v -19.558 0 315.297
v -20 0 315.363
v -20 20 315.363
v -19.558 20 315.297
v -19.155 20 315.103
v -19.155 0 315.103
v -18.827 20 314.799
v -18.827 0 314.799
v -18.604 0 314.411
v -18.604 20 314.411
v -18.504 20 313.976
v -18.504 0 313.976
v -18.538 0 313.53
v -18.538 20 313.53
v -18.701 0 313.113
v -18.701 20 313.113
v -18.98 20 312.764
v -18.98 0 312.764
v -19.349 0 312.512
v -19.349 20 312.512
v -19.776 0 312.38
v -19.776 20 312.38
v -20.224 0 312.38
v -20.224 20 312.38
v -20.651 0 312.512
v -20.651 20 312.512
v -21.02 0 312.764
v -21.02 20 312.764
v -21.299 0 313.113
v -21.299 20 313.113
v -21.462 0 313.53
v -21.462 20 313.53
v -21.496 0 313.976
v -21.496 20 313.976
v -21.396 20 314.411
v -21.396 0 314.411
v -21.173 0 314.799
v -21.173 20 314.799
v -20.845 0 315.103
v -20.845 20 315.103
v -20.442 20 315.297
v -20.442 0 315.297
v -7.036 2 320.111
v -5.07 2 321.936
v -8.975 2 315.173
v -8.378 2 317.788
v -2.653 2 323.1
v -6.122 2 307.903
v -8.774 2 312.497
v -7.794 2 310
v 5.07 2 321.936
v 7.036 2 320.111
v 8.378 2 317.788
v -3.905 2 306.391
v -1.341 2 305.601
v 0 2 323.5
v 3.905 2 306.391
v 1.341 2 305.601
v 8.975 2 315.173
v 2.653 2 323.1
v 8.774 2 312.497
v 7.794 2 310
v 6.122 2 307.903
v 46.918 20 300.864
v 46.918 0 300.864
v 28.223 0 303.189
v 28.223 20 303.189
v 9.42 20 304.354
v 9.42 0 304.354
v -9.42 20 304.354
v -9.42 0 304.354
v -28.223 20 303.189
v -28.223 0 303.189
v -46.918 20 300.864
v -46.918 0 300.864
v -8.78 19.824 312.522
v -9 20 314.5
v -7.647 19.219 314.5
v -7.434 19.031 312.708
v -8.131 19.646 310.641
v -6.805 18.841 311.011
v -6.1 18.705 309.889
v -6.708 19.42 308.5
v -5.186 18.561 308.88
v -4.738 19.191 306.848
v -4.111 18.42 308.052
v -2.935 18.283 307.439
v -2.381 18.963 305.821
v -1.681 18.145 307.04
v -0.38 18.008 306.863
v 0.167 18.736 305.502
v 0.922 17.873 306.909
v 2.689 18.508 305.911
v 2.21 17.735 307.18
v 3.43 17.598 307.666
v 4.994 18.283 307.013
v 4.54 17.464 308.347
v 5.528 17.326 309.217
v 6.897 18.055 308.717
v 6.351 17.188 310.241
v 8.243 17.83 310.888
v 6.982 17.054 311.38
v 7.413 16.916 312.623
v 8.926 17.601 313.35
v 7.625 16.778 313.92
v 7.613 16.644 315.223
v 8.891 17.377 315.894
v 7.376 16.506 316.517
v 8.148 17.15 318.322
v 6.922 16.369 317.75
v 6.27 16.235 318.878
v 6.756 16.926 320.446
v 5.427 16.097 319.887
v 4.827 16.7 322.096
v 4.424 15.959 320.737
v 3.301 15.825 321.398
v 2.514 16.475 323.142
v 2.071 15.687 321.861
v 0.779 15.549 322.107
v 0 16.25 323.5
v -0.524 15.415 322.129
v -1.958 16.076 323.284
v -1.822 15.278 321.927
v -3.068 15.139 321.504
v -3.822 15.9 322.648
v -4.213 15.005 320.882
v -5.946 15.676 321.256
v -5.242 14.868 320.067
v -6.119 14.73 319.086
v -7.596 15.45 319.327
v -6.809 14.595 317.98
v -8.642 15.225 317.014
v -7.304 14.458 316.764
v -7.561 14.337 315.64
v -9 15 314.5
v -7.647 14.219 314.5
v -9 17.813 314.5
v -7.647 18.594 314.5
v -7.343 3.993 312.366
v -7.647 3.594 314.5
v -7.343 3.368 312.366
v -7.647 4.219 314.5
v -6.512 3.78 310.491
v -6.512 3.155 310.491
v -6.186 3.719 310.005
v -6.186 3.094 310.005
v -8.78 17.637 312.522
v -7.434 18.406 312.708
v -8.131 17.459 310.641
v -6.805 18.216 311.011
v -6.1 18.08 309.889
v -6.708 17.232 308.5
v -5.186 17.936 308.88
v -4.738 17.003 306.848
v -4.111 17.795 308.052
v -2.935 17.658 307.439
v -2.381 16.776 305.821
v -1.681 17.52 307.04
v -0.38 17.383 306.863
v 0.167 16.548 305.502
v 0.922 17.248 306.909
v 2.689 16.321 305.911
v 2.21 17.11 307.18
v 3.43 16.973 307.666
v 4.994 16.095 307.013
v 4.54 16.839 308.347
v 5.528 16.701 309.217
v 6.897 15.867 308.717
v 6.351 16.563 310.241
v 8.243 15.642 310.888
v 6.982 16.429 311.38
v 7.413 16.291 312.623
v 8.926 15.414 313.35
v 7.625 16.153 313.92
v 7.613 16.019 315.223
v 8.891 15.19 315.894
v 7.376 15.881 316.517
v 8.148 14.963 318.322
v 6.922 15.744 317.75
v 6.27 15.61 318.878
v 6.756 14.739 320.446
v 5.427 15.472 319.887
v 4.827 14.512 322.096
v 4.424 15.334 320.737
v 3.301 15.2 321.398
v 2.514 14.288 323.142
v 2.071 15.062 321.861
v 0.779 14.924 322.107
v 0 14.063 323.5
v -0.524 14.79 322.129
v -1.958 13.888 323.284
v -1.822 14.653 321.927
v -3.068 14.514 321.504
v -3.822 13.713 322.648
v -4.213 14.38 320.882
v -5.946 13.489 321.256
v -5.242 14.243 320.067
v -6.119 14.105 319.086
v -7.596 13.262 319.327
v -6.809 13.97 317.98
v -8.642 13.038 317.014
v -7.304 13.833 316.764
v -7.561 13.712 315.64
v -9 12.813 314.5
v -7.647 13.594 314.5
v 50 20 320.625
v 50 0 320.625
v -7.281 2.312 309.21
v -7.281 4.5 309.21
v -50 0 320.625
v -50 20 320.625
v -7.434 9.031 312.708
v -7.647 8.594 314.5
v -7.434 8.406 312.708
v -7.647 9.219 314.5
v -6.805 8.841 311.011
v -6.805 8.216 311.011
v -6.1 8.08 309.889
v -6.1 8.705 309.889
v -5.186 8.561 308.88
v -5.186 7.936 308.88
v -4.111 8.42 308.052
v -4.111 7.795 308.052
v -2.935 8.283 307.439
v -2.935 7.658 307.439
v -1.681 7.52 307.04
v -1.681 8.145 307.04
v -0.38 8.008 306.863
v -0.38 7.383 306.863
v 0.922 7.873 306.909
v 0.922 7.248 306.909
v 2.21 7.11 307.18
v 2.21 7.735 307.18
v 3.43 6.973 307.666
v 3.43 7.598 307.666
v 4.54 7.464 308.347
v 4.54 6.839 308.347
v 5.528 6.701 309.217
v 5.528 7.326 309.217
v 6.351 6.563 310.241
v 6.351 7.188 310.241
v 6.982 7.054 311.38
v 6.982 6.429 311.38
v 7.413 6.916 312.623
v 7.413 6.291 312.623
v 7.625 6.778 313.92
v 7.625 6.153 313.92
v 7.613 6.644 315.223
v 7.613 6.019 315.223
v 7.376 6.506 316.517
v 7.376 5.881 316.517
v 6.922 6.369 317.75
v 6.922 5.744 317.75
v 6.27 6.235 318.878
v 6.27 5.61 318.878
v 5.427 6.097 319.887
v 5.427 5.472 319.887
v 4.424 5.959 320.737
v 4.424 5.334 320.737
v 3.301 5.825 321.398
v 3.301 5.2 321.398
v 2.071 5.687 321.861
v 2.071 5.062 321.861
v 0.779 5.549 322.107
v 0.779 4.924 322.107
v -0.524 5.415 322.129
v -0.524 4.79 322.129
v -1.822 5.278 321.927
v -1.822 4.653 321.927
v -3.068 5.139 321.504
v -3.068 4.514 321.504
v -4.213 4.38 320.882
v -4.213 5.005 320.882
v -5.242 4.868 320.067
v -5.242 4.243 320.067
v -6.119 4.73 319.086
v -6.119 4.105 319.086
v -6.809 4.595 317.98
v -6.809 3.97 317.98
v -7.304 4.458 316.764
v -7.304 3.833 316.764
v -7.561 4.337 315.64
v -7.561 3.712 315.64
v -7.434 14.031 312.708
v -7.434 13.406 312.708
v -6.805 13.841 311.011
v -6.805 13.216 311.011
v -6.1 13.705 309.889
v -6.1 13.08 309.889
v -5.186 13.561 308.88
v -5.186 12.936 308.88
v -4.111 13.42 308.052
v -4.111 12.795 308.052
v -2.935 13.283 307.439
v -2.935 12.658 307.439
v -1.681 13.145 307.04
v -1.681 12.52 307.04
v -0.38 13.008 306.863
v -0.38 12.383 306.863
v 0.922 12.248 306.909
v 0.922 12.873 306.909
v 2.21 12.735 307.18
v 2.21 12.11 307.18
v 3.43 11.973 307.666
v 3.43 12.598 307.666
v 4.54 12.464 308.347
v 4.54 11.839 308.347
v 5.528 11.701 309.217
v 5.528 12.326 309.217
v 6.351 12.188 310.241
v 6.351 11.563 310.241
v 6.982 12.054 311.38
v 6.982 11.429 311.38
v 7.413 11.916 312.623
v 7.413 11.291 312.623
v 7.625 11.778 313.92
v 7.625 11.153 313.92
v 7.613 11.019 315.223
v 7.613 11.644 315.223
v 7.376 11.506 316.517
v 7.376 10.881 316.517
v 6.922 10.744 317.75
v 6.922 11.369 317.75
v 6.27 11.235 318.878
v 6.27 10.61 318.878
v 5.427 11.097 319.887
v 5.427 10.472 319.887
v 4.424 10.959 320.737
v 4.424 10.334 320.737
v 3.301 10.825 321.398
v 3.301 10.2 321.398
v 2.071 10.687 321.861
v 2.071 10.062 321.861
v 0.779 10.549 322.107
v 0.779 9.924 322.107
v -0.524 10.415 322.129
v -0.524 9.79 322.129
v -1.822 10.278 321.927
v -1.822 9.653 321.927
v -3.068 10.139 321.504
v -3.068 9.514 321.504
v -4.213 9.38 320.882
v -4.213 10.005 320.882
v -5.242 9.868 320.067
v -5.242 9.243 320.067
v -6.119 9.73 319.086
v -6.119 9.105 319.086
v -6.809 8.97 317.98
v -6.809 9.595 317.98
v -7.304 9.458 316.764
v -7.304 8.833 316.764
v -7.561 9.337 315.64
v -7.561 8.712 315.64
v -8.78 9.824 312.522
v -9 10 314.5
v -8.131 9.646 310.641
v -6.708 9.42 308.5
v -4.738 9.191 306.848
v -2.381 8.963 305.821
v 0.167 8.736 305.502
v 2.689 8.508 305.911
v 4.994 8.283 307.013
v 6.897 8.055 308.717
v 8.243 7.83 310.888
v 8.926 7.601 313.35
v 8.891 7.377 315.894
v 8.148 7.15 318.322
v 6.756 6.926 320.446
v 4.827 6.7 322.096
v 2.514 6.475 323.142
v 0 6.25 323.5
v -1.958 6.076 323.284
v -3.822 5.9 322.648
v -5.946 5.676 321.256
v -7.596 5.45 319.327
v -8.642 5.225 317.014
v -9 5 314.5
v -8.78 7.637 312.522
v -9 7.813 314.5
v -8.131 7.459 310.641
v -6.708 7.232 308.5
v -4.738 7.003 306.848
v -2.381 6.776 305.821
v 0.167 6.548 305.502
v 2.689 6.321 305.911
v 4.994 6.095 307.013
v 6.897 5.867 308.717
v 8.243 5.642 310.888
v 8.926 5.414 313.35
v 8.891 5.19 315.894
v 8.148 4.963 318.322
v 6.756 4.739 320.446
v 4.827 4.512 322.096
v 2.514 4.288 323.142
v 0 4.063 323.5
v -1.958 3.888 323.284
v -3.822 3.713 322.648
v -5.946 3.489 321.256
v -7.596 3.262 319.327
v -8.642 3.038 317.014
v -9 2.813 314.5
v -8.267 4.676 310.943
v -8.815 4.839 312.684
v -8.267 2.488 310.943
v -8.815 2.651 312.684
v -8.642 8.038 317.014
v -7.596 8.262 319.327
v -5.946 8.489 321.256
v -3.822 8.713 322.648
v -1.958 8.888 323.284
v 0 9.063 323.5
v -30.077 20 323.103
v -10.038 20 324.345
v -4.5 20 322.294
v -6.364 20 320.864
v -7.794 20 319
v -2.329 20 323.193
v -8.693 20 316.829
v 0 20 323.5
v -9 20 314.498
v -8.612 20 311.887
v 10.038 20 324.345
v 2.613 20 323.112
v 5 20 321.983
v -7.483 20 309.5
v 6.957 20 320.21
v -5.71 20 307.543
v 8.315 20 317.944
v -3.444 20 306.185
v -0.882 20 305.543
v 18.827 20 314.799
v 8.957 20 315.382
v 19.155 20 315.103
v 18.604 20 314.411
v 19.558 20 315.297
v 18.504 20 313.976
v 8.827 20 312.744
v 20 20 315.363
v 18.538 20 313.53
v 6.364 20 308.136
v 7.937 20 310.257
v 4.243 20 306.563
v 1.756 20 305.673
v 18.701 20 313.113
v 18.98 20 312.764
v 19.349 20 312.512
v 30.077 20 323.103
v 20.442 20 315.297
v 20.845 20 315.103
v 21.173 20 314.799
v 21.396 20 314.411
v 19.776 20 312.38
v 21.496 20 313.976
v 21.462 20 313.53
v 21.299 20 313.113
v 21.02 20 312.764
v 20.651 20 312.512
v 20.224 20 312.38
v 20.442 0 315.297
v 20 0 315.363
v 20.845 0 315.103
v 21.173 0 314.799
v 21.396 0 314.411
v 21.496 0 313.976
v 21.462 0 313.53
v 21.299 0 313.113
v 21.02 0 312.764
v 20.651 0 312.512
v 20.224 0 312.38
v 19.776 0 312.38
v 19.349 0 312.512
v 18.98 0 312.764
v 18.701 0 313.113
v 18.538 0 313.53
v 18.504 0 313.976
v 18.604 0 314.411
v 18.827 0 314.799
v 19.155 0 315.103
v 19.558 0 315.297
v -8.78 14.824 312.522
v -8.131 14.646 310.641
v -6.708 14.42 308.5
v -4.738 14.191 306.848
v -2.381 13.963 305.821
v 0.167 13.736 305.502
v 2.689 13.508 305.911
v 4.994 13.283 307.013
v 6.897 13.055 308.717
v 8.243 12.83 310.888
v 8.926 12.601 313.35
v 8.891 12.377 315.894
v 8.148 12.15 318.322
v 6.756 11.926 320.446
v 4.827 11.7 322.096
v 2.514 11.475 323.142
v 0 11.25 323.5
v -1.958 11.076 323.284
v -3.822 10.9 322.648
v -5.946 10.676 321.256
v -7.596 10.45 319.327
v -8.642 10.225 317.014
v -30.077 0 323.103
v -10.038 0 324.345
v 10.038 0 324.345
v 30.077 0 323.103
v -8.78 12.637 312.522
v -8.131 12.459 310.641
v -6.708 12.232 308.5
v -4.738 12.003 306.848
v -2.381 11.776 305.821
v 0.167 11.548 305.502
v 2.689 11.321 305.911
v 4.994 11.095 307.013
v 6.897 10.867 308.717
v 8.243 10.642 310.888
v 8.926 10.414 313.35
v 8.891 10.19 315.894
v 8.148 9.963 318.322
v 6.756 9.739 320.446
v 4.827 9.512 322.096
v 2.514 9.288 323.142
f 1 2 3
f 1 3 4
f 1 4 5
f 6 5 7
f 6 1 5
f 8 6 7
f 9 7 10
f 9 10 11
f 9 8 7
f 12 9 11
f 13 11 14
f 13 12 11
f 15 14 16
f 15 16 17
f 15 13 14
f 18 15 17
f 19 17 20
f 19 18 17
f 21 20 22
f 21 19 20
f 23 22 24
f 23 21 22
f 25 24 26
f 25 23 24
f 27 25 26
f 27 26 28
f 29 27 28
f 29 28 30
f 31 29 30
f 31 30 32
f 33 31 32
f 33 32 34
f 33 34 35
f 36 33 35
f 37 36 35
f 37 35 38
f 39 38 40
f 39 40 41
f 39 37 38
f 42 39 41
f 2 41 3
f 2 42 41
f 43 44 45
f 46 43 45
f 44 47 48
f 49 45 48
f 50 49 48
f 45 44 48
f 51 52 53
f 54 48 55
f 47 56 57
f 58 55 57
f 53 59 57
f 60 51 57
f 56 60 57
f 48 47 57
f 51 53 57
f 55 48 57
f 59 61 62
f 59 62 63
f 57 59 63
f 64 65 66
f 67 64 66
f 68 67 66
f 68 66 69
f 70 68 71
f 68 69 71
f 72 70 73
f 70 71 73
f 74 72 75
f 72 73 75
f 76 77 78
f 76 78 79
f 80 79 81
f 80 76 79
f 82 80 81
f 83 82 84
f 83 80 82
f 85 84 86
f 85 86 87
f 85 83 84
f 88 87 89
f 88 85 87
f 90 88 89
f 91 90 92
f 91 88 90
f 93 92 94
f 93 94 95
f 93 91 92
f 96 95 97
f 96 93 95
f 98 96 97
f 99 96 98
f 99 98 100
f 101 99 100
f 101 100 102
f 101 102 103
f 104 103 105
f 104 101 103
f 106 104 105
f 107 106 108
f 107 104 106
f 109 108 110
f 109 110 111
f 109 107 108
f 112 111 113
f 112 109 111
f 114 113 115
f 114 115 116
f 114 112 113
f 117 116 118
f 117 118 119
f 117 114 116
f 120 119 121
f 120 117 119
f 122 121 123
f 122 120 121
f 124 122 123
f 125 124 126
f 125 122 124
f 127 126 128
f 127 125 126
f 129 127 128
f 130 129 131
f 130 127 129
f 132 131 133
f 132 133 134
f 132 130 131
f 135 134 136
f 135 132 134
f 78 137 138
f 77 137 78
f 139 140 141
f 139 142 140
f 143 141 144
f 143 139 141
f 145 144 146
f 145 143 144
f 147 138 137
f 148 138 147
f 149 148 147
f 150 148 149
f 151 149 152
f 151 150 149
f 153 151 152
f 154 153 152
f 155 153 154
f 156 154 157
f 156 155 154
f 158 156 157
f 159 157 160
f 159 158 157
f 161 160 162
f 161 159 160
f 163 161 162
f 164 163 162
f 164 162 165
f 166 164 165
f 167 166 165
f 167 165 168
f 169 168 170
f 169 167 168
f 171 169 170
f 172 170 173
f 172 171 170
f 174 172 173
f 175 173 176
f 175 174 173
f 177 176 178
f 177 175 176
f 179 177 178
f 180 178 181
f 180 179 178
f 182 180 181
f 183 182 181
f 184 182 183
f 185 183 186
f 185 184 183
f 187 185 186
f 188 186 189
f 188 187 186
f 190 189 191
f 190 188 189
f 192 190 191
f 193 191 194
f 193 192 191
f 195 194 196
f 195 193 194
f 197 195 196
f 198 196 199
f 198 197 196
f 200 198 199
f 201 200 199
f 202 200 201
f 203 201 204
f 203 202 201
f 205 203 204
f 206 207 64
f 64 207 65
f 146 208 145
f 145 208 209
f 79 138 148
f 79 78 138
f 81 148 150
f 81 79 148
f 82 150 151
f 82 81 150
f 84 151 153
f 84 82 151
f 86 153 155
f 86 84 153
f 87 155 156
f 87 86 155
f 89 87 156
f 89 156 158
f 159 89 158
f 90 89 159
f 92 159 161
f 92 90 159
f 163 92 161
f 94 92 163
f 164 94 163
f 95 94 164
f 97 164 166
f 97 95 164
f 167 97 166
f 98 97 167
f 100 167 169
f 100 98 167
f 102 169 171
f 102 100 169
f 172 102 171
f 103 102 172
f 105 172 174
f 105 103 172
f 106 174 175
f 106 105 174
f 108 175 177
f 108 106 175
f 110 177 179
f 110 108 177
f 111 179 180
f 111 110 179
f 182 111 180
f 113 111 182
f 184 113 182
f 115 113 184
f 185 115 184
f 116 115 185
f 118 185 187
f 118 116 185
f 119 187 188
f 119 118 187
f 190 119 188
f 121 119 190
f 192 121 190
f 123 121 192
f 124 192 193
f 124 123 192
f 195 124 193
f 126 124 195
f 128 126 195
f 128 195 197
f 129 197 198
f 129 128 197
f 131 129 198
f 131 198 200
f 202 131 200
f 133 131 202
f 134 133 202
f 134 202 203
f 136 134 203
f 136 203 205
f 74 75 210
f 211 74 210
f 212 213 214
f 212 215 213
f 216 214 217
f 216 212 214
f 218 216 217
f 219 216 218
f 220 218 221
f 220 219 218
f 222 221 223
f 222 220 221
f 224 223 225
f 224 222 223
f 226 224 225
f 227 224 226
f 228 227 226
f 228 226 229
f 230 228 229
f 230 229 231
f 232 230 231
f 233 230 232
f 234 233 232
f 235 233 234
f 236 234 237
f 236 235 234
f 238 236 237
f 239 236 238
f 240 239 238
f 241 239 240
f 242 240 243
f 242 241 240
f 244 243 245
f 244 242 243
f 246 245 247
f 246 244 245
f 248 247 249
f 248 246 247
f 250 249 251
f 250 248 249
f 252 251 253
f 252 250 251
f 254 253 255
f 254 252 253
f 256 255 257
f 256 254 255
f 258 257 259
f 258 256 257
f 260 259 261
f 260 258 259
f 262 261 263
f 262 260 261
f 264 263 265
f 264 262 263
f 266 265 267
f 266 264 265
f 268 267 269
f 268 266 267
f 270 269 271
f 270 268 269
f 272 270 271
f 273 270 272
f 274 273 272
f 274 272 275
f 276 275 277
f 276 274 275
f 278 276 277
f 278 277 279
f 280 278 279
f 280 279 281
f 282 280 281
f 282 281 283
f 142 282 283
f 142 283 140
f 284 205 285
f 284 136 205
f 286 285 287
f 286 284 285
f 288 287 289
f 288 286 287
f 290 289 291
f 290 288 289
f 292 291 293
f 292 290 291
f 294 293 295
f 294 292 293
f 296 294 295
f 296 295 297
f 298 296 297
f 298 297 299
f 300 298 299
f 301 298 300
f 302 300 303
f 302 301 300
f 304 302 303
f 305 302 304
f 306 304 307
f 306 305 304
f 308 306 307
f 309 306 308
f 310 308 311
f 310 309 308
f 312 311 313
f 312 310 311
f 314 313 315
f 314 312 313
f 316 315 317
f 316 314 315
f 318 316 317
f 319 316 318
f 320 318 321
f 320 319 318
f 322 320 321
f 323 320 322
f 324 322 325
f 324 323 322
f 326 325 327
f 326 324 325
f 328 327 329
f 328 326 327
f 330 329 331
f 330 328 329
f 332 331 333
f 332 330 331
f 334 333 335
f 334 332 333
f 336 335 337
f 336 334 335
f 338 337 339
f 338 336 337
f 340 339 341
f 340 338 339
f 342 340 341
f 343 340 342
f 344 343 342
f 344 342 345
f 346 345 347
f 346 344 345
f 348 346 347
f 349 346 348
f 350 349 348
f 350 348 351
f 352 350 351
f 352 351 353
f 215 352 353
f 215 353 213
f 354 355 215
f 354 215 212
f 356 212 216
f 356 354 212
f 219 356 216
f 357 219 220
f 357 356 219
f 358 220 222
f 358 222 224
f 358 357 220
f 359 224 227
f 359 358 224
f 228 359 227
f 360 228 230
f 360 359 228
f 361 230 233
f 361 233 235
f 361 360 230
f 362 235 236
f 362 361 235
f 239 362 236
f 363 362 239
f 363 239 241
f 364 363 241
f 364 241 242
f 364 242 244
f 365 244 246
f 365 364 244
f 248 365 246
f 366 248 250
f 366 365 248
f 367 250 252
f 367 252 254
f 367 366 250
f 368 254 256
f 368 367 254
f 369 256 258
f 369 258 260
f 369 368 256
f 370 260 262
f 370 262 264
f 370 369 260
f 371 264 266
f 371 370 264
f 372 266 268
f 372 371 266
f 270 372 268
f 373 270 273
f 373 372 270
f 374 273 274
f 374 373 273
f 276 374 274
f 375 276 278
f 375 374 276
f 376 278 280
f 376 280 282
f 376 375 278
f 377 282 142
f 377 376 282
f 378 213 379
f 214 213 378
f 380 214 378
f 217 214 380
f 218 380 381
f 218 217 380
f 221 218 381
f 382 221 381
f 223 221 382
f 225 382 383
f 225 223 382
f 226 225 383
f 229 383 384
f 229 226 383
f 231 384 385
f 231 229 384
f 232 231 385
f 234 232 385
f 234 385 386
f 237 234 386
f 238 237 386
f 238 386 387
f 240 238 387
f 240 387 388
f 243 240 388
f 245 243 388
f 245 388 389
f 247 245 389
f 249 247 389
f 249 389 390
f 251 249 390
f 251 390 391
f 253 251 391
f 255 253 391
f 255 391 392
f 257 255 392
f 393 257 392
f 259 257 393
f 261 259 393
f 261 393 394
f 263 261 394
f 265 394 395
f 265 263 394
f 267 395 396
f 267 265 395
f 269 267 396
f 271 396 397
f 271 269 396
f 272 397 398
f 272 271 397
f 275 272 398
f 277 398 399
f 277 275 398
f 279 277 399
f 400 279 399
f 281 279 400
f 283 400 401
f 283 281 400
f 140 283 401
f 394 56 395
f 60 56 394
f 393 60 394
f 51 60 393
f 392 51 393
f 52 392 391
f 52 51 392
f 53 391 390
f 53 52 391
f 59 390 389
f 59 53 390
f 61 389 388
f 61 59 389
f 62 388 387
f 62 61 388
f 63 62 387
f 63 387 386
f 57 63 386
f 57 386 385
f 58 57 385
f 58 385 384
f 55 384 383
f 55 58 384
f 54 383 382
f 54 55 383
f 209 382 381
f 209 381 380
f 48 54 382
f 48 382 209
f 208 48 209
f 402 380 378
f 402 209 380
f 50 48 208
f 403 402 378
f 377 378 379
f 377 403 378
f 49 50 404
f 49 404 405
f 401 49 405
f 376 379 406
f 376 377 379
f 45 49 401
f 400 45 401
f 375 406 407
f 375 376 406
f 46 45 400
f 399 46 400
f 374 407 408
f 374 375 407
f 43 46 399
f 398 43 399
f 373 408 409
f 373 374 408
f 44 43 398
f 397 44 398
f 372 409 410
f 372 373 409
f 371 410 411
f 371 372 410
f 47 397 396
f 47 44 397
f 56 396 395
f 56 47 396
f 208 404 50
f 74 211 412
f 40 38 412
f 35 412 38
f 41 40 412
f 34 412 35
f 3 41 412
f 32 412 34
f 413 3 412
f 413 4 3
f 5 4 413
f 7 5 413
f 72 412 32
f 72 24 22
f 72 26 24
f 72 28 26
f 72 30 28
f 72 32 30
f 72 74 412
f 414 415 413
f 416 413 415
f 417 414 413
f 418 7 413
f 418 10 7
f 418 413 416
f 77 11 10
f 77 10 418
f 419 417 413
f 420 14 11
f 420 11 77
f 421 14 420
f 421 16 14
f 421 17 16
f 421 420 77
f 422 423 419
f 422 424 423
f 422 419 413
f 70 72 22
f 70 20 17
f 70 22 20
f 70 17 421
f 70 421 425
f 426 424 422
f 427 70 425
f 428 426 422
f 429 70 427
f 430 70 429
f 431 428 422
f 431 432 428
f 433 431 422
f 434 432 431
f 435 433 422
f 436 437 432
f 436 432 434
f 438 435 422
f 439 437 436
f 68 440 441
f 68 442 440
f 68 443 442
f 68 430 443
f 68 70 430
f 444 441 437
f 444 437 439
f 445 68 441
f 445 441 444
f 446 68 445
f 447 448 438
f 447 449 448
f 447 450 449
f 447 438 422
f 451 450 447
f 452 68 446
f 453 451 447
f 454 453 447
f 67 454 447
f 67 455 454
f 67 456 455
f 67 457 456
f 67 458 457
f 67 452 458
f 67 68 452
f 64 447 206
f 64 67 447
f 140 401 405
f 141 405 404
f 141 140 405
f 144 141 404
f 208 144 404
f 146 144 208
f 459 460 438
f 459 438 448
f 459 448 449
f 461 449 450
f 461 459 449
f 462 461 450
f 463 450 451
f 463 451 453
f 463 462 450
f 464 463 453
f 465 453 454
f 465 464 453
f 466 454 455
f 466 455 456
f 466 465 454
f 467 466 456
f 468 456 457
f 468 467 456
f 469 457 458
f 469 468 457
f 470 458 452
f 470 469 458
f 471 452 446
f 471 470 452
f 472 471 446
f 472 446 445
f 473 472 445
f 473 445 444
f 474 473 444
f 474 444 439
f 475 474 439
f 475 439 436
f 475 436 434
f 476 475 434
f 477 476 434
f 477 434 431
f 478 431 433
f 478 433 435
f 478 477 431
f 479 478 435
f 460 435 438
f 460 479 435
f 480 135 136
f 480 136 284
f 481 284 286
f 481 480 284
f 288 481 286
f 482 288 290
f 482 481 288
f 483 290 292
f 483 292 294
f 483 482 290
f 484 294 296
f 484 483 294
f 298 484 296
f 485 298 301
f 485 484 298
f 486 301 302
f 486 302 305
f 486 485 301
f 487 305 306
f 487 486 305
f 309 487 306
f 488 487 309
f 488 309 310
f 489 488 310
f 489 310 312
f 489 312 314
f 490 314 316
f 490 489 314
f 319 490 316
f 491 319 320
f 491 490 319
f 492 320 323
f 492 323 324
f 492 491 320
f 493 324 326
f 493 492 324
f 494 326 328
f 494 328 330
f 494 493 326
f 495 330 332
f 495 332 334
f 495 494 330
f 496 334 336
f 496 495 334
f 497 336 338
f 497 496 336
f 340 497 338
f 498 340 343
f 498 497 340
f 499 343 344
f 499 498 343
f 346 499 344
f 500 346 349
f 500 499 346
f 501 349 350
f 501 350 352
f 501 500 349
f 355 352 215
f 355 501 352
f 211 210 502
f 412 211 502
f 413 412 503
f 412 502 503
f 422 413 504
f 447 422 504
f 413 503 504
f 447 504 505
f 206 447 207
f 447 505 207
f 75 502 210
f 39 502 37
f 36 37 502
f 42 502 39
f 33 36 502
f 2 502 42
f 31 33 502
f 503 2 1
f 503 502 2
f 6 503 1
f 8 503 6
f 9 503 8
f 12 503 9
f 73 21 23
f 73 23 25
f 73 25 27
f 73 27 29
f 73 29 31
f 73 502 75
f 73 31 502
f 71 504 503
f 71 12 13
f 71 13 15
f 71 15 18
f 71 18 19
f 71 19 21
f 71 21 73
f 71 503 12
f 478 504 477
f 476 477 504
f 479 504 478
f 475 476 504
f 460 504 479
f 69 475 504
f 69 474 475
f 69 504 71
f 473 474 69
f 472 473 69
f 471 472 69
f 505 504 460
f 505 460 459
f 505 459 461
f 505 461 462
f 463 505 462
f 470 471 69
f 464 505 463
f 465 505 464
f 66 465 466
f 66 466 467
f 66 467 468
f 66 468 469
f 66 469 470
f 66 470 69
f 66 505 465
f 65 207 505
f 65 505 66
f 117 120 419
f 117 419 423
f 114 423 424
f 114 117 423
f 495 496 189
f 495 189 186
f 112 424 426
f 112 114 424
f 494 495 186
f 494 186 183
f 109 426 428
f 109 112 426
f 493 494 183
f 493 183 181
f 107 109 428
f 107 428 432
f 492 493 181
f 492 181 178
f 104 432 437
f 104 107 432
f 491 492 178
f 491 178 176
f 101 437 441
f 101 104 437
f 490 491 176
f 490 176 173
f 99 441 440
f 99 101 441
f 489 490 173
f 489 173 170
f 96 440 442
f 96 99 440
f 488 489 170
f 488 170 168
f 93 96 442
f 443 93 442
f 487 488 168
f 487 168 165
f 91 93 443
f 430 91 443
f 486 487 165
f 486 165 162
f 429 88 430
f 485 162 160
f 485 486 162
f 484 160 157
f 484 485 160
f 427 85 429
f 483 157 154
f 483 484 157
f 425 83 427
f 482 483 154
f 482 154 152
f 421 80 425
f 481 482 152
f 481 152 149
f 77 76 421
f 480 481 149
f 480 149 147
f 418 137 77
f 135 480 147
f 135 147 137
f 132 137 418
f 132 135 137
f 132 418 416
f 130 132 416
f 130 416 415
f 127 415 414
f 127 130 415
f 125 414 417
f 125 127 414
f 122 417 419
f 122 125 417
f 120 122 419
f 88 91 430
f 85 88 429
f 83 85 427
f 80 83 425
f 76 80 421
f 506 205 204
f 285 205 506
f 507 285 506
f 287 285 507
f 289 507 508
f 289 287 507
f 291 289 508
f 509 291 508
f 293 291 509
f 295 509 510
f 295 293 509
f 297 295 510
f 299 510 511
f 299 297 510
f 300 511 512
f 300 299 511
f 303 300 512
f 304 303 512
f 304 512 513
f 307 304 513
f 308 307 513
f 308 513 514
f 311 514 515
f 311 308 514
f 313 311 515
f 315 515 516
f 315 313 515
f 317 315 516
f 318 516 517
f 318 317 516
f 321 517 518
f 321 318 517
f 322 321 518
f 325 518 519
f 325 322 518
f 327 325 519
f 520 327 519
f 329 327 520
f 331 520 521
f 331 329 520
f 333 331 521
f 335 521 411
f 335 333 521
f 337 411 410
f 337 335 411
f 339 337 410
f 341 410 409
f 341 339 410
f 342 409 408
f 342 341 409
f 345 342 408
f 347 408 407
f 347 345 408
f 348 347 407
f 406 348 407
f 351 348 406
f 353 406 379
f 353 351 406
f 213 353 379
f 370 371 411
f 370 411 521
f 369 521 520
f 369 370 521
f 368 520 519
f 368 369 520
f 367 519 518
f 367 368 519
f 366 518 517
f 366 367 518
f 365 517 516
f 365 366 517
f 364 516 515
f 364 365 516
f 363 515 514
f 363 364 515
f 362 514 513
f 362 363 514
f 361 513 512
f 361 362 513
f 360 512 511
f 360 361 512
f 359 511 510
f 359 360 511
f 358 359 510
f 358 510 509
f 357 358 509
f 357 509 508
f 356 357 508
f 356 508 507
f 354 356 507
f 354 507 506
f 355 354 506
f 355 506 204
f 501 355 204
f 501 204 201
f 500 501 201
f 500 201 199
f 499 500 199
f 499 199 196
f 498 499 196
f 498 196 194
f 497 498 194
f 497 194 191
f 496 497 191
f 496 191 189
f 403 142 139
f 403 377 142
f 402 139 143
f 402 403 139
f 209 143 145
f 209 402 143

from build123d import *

# Parameters (mm, degrees)
SKETCH1_R           = 1.5
SKETCH1_R_2         = 9
BOSS_EXTRUDE1_DEPTH = 20
SKETCH3_R           = 9
BOSS_EXTRUDE2_DEPTH = 2
THREAD1_PITCH       = 5


with BuildPart() as part:
    # Sketch1 → Boss-Extrude1 (new body)
    with BuildSketch(Plane(origin=(0, 0, 0), x_dir=(1, 0, 0), z_dir=(0, 1, 0))):
        with BuildLine():
            ThreePointArc((-50, -320.624780702), (0, -324.5), (50, -320.624780702))
            Line((50, -320.624780702), (46.918335901, -300.863623185))
            ThreePointArc((46.918335901, -300.863623185), (0, -304.5), (-46.918335901, -300.863623185))
            Line((-46.918335901, -300.863623185), (-50, -320.624780702))
        make_face()
        with Locations(Location((-20, -313.863425713, 0), (0, 0, 270))):
            Circle(SKETCH1_R, mode=Mode.SUBTRACT)
        with Locations(Location((0, -314.5, 0), (0, 0, 270))):
            Circle(SKETCH1_R_2, mode=Mode.SUBTRACT)
        with Locations(Location((20, -313.863425713, 0), (0, 0, 270))):
            Circle(SKETCH1_R, mode=Mode.SUBTRACT)
    extrude(amount=BOSS_EXTRUDE1_DEPTH)

    # Sketch3 → Boss-Extrude2 (add)
    with BuildSketch(Plane(origin=(0, 0, 0), x_dir=(-1, 0, 0), z_dir=(0, -1, 0))):
        with Locations(Location((0, -314.5, 0), (0, 0, 90))):
            Circle(SKETCH3_R)
    extrude(amount=-BOSS_EXTRUDE2_DEPTH)

    # Thread1: arcs per turn and ends read off the stored shape
    # Thread1: the profile of Thread Profile1 profile screwed along a right-hand helix through 3.100003 turns, 12 arcs to a turn; built about Z, then put on its axis
    thread1_z = Axis((0, 0, 0), (0, 0, 1))
    thread1_corners = [(9.0003, 0, -0.000173205), (9.0003, 0, 2.187673198), (7.646835313, 0, 1.406249997), (7.646835313, 0, 0.781249997)]
    with BuildLine(mode=Mode.PRIVATE) as thread1_profile:
        Line(thread1_corners[0], thread1_corners[1])
        Line(thread1_corners[1], thread1_corners[2])
        Line(thread1_corners[2], thread1_corners[3])
        Line(thread1_corners[3], thread1_corners[0])
    thread1_cap = Face(thread1_profile.wire())
    thread1_turn_angles = [0, 15, 30, 45, 60, 75, 90, 105, 120, 135, 150, 165, 180, 195, 210, 225, 240, 255, 270, 285, 300, 315, 330, 345, 360]
    thread1_turn_weights = [1, 0.9659258262890683, 1, 0.9659258262890683, 1, 0.9659258262890683, 1, 0.9659258262890683, 1, 0.9659258262890683, 1, 0.9659258262890683, 1, 0.9659258262890683, 1, 0.9659258262890683, 1, 0.9659258262890683, 1, 0.9659258262890683, 1, 0.9659258262890683, 1, 0.9659258262890683, 1]
    thread1_turn_rails = [Edge.make_bspline([Vector(p[0], p[1], 0).rotate(thread1_z, thread1_turn_angles[k]) / thread1_turn_weights[k] + Vector(0, 0, p[2] + THREAD1_PITCH * thread1_turn_angles[k] / 360) for k in range(25)], [0, 0, 0, 1, 1, 2, 2, 3, 3, 4, 4, 5, 5, 6, 6, 7, 7, 8, 8, 9, 9, 10, 10, 11, 11, 12, 12, 12], 2, thread1_turn_weights) for p in thread1_corners]
    thread1_turn_sides = [Face.make_surface_from_curves(thread1_turn_rails[p[0]], thread1_turn_rails[p[1]]) for p in [(0, 1), (1, 2), (2, 3), (3, 0)]]
    thread1_last_angles = [1080, 1095, 1110, 1113.0005, 1116.001]
    thread1_last_weights = [1, 0.9659258262890683, 1, 0.9986290779991721, 1]
    thread1_last_rails = [Edge.make_bspline([Vector(p[0], p[1], 0).rotate(thread1_z, thread1_last_angles[k]) / thread1_last_weights[k] + Vector(0, 0, p[2] + THREAD1_PITCH * thread1_last_angles[k] / 360) for k in range(5)], [0, 0, 0, 1, 1, 2, 2, 2], 2, thread1_last_weights) for p in thread1_corners]
    thread1_last_sides = [Face.make_surface_from_curves(thread1_last_rails[p[0]], thread1_last_rails[p[1]]) for p in [(0, 1), (1, 2), (2, 3), (3, 0)]]
    thread1 = Plane(origin=(0, 20, 314.5), x_dir=(-1, 0, 0), z_dir=(0, -1, 0)) * Solid(Shell([*[p.moved(Location((0, 0, THREAD1_PITCH * i))) for i in range(3) for p in thread1_turn_sides], *thread1_last_sides, thread1_cap, thread1_cap.rotate(thread1_z, 1116.001).moved(Location((0, 0, THREAD1_PITCH * 1116.001 / 360)))]))
    add(thread1)


solid = part.part
